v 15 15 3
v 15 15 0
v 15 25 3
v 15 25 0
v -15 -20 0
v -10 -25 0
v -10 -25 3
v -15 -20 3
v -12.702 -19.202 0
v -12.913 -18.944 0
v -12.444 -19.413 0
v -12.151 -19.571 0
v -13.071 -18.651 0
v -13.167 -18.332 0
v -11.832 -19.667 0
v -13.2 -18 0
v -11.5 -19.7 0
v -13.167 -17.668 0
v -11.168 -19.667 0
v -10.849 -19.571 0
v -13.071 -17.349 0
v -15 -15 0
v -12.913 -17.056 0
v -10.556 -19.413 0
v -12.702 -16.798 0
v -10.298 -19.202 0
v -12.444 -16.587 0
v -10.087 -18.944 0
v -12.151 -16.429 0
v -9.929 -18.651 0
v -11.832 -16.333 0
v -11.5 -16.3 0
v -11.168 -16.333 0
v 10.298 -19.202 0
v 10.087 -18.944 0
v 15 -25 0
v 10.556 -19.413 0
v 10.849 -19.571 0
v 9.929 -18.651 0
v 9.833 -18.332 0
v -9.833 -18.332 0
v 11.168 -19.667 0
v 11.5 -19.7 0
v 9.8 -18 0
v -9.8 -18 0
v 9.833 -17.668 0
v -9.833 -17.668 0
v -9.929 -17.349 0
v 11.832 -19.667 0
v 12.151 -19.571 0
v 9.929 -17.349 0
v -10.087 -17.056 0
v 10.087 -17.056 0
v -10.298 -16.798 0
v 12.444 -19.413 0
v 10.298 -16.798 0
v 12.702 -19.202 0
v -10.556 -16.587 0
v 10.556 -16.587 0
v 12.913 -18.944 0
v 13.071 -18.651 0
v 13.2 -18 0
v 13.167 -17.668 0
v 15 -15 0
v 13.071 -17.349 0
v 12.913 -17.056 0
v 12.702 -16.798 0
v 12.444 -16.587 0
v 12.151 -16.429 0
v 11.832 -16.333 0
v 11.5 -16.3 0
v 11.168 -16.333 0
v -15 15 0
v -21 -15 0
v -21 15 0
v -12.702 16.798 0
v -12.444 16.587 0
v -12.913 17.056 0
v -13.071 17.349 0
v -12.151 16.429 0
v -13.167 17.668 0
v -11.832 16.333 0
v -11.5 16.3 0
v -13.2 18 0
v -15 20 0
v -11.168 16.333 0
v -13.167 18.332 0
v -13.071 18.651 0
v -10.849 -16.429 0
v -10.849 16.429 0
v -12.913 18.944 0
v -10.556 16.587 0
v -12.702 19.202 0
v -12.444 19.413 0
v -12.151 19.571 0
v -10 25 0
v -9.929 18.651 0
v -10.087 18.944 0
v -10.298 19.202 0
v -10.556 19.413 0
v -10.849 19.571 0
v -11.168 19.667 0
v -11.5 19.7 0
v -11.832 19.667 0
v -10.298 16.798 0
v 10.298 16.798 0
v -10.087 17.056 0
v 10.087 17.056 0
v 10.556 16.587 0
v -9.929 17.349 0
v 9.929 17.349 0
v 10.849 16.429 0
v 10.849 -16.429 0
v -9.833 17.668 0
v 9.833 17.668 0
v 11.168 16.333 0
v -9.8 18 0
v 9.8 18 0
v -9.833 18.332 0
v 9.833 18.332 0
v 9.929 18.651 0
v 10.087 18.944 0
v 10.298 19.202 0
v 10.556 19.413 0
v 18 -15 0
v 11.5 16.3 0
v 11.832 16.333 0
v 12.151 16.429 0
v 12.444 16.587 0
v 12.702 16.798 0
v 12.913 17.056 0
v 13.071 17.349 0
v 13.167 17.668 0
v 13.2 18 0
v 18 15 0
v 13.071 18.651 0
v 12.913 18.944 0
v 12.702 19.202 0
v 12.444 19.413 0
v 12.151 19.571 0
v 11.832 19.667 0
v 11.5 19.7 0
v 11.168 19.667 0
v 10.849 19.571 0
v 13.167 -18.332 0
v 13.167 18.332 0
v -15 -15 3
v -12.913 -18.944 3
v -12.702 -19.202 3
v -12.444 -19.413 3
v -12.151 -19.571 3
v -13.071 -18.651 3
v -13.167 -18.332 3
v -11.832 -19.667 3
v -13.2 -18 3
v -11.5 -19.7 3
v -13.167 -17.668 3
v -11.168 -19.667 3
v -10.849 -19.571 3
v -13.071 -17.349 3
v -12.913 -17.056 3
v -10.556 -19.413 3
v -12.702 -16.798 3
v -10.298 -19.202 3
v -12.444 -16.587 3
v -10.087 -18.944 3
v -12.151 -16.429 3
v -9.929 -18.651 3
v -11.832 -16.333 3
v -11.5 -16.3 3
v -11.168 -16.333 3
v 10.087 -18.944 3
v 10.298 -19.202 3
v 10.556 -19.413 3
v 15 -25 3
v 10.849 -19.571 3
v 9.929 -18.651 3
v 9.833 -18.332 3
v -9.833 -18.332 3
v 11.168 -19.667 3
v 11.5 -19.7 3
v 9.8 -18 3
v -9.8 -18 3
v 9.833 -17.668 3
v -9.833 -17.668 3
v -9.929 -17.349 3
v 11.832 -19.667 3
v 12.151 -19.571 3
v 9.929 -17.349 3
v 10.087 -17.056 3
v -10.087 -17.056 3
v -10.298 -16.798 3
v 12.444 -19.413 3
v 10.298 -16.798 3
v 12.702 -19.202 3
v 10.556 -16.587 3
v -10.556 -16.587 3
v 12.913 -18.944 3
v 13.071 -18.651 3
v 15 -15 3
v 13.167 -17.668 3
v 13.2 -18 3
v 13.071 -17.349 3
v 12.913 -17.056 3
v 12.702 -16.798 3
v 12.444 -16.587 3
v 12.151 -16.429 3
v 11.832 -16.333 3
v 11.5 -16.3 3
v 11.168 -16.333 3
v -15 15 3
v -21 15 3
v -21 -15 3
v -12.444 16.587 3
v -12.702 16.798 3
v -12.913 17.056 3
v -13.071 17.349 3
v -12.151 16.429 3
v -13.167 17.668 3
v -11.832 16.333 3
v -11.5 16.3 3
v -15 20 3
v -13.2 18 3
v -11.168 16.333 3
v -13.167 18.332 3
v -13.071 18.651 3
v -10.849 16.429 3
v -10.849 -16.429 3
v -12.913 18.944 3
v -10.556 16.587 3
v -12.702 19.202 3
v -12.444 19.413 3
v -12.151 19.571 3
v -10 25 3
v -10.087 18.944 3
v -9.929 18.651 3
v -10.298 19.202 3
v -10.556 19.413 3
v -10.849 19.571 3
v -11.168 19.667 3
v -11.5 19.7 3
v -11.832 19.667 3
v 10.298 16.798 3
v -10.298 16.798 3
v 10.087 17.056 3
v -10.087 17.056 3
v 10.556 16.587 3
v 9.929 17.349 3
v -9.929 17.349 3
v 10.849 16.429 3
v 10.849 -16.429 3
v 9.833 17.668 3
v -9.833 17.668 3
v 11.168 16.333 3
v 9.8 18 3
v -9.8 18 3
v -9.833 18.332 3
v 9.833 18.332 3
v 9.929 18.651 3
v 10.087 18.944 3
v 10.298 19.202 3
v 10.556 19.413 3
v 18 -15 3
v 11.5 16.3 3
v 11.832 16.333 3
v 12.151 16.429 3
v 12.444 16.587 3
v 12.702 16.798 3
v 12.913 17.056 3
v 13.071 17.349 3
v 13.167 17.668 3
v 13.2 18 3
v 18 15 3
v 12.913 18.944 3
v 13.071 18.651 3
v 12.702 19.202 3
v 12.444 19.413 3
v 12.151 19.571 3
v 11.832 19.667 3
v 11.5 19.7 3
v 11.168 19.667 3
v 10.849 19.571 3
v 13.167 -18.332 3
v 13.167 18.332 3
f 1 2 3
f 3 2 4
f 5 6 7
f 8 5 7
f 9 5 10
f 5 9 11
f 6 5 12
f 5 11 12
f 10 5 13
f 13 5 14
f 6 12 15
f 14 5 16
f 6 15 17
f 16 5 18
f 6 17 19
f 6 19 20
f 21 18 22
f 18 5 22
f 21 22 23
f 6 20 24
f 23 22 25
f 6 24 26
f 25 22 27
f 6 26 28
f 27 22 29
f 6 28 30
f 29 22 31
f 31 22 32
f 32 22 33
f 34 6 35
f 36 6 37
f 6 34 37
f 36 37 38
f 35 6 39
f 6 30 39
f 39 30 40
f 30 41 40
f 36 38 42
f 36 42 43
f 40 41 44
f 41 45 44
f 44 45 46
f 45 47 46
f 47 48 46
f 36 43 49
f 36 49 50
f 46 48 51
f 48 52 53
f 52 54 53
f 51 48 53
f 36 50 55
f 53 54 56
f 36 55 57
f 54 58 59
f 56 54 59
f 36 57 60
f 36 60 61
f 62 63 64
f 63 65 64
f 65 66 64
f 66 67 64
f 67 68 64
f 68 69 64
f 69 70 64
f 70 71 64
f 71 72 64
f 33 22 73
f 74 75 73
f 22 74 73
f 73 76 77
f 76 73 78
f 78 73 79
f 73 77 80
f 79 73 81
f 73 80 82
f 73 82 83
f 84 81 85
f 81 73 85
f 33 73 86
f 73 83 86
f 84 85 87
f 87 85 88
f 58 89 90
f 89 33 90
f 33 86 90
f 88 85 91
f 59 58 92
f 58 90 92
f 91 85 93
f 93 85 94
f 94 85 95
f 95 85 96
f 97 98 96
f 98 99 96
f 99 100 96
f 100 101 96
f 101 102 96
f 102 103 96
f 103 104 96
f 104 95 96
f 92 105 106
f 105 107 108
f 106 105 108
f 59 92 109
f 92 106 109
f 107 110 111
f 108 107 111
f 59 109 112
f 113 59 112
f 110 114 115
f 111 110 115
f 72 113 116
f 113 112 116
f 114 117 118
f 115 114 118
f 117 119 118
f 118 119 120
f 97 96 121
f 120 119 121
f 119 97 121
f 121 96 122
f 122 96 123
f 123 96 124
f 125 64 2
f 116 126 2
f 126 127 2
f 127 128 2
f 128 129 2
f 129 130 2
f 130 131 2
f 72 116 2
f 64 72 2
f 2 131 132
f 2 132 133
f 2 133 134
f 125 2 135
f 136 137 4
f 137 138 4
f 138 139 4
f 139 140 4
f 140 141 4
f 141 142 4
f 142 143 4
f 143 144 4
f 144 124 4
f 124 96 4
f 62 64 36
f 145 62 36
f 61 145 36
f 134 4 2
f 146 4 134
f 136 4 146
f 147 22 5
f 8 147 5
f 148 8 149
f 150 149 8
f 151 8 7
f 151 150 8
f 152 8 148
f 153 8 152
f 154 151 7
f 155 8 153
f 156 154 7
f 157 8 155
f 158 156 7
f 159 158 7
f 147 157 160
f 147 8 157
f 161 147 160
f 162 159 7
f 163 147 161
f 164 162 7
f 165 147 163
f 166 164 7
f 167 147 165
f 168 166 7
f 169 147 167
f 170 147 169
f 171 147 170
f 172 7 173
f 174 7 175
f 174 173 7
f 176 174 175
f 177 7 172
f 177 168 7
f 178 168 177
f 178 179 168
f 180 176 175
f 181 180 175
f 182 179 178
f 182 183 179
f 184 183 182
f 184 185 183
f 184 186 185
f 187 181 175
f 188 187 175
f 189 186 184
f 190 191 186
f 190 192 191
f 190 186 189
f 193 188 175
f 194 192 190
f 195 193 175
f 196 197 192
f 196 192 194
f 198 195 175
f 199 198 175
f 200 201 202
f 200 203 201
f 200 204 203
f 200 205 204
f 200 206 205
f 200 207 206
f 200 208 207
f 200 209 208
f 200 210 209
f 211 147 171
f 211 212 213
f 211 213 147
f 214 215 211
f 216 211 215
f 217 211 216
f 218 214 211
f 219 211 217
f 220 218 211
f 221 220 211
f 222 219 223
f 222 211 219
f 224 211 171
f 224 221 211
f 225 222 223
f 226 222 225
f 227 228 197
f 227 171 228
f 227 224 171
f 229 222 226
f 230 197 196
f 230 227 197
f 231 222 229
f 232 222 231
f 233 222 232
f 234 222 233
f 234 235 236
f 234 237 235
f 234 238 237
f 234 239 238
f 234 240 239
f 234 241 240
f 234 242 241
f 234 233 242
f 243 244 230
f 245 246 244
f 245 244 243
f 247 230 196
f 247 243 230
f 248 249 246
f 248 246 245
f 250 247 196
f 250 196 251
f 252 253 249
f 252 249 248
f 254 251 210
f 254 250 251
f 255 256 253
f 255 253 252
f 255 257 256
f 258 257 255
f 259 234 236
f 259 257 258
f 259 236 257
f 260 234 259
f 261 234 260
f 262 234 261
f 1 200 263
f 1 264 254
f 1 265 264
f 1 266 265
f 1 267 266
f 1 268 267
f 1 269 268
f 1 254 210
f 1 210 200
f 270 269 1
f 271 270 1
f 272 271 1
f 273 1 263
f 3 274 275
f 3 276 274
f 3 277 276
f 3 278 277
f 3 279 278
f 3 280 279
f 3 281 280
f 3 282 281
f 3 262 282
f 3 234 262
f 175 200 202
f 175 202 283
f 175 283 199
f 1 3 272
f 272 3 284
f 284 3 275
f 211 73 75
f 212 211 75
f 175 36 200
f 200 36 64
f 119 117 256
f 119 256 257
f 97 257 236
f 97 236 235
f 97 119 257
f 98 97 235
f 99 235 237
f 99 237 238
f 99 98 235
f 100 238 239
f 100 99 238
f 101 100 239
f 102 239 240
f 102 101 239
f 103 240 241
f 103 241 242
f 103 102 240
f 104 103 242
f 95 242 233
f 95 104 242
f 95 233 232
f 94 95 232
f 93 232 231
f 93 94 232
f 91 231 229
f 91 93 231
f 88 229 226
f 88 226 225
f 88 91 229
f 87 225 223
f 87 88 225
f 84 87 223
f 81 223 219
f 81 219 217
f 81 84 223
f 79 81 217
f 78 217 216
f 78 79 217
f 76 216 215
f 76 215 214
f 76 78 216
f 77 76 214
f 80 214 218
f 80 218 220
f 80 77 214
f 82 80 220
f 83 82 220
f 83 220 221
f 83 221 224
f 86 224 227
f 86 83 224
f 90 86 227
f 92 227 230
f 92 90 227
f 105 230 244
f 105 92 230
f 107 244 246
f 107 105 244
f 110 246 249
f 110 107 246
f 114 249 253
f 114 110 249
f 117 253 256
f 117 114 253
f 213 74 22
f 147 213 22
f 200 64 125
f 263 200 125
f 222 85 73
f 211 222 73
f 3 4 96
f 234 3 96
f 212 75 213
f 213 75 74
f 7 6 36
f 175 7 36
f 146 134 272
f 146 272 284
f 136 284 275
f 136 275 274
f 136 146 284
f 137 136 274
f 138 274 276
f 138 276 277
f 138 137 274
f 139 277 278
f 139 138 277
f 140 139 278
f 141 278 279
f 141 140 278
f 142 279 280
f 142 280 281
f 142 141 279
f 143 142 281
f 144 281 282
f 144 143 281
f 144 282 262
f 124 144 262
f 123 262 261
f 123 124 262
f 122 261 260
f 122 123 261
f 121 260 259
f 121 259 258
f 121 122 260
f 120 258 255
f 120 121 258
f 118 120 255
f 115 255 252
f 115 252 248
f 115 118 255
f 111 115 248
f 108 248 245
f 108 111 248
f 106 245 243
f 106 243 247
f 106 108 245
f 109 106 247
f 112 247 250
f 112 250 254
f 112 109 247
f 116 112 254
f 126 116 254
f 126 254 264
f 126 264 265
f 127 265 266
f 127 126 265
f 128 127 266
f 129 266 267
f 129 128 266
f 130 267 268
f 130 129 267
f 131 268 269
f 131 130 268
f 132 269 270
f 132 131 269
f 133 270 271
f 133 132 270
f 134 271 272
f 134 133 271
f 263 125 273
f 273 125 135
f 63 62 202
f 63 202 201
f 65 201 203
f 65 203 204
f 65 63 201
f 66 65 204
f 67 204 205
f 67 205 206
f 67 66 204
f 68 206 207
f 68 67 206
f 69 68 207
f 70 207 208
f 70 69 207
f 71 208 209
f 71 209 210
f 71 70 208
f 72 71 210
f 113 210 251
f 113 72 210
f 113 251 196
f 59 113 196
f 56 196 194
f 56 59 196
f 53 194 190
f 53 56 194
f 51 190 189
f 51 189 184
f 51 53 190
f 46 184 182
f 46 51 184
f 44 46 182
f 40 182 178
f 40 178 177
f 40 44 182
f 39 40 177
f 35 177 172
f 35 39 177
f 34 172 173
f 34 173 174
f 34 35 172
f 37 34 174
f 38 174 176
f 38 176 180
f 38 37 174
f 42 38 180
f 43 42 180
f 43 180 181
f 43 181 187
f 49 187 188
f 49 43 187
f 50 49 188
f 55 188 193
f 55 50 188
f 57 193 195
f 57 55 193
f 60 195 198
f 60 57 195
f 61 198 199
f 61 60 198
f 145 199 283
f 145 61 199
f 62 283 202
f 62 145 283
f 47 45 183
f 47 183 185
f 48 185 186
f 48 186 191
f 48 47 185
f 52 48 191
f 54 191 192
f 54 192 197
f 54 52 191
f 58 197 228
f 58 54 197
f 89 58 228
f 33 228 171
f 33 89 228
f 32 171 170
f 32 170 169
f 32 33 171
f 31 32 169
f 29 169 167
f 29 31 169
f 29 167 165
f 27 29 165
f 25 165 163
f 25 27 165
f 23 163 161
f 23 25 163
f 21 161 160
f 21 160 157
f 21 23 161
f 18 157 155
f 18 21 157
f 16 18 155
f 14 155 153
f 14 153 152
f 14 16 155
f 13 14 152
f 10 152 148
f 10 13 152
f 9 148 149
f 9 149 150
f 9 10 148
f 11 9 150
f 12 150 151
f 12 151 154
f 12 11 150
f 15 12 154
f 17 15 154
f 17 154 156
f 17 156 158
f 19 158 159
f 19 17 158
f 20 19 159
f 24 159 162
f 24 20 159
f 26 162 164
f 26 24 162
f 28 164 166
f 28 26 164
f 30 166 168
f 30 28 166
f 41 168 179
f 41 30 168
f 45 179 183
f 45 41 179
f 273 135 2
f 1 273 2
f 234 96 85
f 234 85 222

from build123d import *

# Parameters (mm, degrees)
SKETCH1_R           = 1.7
BOSS_EXTRUDE1_DEPTH = 3
CHAMFER1_SIZE       = 5


with BuildPart() as part:
    # Sketch1 → Boss-Extrude1 (new body)
    with BuildSketch(Plane.XY):
        Polygon((-15, -25), (15, -25), (15, -15), (18, -15), (18, 15), (15, 15), (15, 25), (-15, 25), (-15, 15), (-21, 15), (-21, -15), (-15, -15), align=None)
        with Locations((11.5, -18)):
            Circle(SKETCH1_R, mode=Mode.SUBTRACT)
        with Locations((11.5, 18)):
            Circle(SKETCH1_R, mode=Mode.SUBTRACT)
        with Locations((-11.5, 18)):
            Circle(SKETCH1_R, mode=Mode.SUBTRACT)
        with Locations((-11.5, -18)):
            Circle(SKETCH1_R, mode=Mode.SUBTRACT)
    extrude(amount=BOSS_EXTRUDE1_DEPTH)

    # Chamfer1
    chamfer1_edges = [part.edges().sort_by_distance(p)[0] for p in [
        (-15, -25, 1.5),
        (-15, 25, 1.5),
    ]]
    chamfer(chamfer1_edges, length=CHAMFER1_SIZE)


solid = part.part
